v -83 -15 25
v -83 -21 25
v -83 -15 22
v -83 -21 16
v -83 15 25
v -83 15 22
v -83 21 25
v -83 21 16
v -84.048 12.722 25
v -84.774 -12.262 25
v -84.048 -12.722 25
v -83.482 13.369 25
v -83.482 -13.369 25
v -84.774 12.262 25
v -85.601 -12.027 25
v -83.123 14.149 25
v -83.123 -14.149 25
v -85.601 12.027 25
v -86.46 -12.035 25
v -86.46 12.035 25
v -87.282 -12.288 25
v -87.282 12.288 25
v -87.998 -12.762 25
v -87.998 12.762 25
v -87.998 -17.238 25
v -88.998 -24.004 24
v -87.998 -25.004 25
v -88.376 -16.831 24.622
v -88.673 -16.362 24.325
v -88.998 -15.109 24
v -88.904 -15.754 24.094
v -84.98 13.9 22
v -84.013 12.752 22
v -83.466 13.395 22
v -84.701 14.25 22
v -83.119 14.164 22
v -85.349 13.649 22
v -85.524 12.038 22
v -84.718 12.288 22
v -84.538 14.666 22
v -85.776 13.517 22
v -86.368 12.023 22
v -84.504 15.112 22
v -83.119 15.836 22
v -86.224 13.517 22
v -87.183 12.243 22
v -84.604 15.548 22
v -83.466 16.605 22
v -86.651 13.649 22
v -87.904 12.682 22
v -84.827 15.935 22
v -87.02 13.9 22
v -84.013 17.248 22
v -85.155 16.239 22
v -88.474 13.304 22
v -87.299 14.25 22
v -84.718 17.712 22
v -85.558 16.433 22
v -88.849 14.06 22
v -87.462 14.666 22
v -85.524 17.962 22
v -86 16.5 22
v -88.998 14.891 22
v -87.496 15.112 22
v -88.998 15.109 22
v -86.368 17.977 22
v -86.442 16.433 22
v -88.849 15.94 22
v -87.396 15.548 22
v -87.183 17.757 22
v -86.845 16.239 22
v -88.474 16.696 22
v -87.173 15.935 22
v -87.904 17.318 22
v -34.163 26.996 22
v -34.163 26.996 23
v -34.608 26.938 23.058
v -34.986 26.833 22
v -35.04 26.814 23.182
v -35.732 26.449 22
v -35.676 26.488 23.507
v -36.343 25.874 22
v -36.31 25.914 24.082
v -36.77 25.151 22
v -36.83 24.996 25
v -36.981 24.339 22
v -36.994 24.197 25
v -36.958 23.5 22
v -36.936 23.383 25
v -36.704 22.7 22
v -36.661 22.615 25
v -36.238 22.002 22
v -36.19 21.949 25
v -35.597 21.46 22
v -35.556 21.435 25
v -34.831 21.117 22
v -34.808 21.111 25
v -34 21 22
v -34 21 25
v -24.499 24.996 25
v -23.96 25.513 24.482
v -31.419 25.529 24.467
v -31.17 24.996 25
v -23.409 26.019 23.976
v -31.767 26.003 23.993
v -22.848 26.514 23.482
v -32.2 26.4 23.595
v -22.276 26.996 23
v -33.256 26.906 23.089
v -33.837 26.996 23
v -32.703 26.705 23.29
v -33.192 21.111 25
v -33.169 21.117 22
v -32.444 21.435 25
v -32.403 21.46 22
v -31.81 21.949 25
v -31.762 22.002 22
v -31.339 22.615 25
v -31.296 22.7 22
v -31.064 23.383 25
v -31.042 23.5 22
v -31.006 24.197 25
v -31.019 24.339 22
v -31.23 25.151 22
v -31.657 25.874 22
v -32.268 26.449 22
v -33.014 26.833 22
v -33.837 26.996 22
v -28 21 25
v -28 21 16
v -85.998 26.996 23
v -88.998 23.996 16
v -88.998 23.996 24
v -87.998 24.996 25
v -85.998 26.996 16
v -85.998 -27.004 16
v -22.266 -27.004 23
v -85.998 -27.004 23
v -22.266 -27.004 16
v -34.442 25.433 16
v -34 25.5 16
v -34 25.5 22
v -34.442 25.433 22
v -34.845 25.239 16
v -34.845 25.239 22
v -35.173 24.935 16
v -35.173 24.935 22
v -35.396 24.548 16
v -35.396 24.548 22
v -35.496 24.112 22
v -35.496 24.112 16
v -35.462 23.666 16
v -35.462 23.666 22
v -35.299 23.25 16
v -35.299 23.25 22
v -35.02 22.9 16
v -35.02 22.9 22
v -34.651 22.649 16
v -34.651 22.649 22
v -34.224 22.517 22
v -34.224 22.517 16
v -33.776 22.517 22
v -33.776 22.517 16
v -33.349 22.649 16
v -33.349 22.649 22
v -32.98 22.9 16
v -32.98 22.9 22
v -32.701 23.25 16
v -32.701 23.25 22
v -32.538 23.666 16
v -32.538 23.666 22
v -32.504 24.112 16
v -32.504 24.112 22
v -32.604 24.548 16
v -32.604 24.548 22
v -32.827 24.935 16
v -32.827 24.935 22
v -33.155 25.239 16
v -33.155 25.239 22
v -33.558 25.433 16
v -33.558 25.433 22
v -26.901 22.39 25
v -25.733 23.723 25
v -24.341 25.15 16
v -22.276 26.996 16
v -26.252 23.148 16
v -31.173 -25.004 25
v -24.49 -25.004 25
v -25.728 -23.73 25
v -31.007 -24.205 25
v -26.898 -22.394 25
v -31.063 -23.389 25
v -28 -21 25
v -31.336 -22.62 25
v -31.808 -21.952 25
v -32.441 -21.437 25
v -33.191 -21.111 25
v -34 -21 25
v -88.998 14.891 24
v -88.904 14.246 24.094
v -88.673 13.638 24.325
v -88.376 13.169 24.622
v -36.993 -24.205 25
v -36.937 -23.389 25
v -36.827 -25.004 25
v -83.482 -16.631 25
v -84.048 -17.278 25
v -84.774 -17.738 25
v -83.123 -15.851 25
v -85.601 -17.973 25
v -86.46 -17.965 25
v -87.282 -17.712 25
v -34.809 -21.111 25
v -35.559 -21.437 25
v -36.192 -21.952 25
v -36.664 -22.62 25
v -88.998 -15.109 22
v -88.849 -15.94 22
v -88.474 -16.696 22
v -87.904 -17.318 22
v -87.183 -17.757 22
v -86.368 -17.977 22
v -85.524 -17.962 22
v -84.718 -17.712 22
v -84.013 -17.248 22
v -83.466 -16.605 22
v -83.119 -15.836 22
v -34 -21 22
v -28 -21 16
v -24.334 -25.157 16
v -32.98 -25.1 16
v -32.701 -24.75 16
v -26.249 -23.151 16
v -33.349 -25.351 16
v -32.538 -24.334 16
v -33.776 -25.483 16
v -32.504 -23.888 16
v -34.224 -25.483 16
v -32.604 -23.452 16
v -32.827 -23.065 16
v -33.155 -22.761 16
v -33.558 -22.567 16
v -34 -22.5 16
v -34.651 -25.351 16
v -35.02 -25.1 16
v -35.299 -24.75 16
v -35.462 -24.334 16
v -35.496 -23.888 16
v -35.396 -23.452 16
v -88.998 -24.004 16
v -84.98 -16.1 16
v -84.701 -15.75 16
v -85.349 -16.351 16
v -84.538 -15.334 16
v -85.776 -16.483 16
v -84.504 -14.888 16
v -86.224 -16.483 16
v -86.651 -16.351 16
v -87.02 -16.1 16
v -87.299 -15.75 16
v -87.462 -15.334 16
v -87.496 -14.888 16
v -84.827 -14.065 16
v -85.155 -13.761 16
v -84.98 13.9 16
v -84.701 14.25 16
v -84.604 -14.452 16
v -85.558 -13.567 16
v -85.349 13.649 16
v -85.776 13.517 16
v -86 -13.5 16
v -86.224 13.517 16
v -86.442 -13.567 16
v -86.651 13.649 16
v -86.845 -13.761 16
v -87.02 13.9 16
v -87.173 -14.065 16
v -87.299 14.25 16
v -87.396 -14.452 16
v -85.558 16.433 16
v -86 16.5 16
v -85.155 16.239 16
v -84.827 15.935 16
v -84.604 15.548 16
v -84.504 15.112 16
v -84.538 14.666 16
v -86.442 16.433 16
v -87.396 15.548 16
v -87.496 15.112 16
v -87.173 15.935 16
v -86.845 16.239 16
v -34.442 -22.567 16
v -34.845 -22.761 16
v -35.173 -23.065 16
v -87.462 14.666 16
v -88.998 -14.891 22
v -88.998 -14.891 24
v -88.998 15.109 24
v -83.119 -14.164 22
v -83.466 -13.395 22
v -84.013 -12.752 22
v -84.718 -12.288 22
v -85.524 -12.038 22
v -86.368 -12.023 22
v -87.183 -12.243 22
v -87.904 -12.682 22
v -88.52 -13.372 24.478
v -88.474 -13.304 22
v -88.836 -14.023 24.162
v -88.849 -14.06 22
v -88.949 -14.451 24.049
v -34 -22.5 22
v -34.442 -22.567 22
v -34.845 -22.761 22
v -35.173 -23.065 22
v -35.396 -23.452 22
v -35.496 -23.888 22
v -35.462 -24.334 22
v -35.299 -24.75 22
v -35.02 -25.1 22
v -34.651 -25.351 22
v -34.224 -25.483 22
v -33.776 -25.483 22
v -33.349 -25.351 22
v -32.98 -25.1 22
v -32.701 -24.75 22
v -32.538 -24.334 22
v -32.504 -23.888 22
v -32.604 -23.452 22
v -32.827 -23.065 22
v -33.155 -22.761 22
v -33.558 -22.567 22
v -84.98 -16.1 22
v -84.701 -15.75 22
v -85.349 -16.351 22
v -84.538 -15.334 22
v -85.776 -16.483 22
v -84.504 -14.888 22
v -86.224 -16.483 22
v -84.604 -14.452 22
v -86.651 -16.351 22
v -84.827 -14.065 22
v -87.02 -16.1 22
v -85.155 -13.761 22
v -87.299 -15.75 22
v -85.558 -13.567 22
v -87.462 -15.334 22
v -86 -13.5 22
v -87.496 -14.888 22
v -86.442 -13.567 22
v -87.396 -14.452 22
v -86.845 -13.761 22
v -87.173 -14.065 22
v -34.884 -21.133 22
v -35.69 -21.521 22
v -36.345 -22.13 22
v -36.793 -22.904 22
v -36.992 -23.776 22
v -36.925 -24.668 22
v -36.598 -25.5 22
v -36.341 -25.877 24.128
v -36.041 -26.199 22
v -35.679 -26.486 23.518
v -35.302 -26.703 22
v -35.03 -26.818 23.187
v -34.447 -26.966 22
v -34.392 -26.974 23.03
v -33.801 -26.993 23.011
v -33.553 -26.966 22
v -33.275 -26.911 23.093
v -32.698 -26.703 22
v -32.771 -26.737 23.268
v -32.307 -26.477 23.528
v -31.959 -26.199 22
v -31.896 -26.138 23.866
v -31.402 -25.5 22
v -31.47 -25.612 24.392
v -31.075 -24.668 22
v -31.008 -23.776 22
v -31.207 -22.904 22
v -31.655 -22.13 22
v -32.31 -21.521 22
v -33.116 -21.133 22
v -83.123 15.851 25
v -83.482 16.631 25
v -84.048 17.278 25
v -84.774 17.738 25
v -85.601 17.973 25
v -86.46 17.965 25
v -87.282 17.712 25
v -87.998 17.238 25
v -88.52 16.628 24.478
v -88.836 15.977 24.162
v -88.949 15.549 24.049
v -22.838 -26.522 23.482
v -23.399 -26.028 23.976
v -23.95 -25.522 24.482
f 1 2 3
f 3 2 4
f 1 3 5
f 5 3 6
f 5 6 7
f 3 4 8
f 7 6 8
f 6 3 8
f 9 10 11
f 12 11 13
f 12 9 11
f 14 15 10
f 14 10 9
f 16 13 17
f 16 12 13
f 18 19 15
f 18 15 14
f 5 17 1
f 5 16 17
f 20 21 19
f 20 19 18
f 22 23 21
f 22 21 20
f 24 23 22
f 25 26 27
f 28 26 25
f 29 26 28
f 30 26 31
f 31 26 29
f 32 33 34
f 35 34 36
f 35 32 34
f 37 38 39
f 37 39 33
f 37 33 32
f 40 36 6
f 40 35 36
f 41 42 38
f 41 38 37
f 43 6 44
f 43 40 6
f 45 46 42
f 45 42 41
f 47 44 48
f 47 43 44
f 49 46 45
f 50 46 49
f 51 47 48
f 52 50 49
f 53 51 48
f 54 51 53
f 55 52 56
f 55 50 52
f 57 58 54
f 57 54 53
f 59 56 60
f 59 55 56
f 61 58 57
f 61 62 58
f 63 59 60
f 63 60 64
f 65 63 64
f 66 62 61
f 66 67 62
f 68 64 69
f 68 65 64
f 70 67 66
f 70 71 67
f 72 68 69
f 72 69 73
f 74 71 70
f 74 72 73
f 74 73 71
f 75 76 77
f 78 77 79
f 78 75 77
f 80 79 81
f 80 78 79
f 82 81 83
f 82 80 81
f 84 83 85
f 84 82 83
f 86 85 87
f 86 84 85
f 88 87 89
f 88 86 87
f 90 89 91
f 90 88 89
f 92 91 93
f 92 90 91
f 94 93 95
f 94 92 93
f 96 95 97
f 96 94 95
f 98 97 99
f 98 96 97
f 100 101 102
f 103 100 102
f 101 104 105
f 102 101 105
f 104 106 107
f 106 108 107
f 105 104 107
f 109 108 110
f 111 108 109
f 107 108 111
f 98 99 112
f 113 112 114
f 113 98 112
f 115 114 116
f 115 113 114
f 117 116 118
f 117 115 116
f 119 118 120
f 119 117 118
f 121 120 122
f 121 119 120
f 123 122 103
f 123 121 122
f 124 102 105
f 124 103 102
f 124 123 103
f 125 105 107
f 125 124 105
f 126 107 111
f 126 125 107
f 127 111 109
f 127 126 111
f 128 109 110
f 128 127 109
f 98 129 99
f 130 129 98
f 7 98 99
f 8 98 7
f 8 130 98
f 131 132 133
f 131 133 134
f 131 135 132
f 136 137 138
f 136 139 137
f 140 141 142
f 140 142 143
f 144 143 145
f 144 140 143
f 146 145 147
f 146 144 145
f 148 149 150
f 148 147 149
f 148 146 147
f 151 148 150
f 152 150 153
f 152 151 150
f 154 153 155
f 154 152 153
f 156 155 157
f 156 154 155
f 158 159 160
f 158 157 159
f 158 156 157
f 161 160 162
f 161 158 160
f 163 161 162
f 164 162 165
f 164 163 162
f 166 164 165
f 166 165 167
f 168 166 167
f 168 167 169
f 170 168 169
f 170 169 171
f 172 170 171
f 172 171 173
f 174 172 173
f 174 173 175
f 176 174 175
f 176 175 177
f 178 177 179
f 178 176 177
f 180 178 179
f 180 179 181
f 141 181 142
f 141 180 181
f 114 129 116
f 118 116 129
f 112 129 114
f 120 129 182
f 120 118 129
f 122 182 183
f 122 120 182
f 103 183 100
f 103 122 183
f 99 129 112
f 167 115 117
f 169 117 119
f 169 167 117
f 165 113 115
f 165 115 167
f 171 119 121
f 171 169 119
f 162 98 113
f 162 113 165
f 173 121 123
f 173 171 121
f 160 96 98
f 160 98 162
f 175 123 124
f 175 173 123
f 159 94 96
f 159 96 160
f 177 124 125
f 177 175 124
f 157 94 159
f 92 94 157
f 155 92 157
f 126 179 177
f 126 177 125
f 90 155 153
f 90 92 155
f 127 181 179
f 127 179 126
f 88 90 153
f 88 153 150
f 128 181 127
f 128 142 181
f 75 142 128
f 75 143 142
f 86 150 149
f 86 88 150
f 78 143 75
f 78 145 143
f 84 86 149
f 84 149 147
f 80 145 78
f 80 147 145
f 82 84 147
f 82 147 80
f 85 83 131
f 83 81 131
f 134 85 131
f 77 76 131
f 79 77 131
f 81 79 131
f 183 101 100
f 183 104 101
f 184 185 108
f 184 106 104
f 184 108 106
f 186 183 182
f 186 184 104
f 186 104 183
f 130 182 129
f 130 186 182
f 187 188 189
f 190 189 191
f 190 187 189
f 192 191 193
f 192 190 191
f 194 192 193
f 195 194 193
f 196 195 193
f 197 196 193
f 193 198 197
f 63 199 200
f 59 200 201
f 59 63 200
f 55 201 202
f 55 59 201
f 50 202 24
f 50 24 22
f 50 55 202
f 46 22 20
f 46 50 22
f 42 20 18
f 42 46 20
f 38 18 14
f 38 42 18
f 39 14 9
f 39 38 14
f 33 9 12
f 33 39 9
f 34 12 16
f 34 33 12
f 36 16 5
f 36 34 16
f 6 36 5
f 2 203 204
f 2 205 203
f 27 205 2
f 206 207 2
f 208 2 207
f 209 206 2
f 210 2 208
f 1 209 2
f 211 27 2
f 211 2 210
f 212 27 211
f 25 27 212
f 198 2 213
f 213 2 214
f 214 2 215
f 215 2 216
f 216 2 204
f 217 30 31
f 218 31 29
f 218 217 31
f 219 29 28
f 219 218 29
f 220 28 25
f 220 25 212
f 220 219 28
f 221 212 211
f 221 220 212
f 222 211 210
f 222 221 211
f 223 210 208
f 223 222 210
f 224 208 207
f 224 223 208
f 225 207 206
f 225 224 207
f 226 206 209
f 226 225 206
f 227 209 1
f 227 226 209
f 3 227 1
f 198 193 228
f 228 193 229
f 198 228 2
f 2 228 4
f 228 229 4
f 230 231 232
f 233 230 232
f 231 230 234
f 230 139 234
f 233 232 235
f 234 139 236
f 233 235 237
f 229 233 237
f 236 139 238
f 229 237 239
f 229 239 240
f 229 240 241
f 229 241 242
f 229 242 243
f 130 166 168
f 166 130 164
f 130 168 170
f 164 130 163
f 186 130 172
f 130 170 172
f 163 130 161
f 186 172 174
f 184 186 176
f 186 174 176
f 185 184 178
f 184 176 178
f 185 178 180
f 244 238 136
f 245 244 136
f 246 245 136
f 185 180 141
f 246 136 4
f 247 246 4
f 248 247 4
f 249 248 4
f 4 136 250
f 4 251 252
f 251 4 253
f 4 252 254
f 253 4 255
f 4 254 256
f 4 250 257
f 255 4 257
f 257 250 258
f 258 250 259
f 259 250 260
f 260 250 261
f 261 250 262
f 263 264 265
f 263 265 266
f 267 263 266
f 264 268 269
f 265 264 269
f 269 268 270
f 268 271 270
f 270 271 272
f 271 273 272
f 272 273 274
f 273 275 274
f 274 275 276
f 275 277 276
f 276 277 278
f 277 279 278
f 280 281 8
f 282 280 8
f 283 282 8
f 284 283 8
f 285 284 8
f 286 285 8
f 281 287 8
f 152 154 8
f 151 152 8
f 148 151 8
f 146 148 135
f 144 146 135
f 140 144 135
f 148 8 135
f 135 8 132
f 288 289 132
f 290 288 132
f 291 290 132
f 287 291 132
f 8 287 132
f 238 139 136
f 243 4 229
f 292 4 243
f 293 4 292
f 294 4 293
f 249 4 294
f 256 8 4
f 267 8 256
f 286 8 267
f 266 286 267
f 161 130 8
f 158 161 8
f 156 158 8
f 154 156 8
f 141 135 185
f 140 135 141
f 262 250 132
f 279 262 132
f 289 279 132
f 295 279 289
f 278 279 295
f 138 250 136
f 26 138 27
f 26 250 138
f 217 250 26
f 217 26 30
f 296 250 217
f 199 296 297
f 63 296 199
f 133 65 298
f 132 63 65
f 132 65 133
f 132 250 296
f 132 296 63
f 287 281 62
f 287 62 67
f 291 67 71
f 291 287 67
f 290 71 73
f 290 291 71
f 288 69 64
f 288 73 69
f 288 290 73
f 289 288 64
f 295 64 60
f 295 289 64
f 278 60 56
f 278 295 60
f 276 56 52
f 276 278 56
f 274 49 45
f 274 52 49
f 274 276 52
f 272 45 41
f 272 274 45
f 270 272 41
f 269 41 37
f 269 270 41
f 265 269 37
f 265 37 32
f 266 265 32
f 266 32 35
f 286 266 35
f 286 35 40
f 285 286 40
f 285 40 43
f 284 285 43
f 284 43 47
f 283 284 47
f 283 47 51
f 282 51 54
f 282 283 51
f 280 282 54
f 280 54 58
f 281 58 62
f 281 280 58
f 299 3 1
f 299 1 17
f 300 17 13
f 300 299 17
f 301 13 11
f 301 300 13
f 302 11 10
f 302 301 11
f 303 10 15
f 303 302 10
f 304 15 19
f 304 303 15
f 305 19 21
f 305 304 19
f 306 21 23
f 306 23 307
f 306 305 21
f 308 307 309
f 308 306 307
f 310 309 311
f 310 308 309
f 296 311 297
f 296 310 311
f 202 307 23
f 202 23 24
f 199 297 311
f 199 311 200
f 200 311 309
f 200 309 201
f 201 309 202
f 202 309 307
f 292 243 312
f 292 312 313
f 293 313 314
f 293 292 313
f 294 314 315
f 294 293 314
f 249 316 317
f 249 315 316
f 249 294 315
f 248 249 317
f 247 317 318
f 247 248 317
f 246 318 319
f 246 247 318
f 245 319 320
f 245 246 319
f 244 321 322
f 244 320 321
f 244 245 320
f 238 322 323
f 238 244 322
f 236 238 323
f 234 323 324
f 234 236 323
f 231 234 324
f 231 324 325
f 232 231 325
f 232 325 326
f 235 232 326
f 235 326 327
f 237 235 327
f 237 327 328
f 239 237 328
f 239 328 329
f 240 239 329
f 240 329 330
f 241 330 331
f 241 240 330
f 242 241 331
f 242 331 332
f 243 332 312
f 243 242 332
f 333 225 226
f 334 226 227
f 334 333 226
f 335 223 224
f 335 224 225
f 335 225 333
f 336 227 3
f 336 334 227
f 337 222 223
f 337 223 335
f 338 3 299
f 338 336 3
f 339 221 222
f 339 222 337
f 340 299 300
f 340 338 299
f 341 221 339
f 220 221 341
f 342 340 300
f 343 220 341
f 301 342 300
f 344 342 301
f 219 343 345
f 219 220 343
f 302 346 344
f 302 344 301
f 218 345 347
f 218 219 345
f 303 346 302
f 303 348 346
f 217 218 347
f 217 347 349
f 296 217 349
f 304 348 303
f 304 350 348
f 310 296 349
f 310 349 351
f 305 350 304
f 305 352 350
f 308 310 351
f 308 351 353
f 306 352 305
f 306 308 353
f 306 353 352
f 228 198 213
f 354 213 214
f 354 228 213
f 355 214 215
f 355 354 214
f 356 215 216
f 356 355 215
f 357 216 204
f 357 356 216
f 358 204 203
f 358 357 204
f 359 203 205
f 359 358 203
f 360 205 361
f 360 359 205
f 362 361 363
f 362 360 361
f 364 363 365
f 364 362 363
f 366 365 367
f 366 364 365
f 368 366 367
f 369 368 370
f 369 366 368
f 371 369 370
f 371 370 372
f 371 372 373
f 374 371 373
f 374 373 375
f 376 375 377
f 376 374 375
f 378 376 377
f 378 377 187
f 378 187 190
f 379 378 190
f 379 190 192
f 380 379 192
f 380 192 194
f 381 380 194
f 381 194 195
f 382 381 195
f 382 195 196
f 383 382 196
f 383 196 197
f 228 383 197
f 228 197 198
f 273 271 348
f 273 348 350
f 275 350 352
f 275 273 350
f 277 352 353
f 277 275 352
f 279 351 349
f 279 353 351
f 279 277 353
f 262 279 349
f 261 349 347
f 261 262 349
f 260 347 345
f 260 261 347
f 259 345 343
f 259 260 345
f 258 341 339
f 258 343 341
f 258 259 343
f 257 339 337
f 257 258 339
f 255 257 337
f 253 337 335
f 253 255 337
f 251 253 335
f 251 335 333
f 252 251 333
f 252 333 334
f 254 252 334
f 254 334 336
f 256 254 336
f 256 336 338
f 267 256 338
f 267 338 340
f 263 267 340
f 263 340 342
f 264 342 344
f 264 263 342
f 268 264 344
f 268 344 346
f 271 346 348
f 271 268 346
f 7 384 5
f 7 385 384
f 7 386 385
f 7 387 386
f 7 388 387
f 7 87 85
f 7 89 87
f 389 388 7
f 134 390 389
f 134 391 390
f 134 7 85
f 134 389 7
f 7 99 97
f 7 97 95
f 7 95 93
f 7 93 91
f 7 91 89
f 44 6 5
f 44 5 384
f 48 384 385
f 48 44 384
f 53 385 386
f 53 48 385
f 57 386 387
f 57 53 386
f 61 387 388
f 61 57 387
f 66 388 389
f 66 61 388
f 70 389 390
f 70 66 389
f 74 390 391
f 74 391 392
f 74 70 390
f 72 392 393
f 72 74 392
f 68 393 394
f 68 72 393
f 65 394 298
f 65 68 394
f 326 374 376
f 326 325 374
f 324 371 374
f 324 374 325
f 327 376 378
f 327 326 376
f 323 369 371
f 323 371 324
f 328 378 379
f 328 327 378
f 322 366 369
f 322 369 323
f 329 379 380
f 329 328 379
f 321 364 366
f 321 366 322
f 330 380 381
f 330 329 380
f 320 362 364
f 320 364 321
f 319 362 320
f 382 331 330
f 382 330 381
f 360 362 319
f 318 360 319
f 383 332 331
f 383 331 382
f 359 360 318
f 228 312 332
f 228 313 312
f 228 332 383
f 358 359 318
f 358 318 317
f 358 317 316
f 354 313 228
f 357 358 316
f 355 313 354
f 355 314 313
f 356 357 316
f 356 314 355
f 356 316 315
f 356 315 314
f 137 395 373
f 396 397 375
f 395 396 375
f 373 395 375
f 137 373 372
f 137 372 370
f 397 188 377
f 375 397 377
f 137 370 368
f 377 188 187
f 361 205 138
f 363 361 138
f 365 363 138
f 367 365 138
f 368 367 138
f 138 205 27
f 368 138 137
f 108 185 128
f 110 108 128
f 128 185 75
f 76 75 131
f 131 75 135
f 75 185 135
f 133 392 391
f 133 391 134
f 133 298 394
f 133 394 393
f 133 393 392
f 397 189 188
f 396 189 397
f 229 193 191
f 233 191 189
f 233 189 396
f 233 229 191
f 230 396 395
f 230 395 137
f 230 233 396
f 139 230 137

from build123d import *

# Parameters (mm, degrees)
CYLINDER1792_R         = 35
CYLINDER1792_DEPTH     = 32
CYLINDER1789_R         = 3
CYLINDER1789_DEPTH     = 3
CYLINDER1790_R         = 3
CYLINDER1790_DEPTH     = 3
CYLINDER1791_R         = 3
CYLINDER1791_DEPTH     = 3
CYLINDER1788_R         = 3
CYLINDER1788_DEPTH     = 3
CYLINDER1785_R         = 1.5
CYLINDER1785_DEPTH     = 60
CYLINDER1786_R         = 1.5
CYLINDER1786_DEPTH     = 60
CYLINDER1787_R         = 1.5
CYLINDER1787_DEPTH     = 60
CYLINDER1784_R         = 1.5
CYLINDER1784_DEPTH     = 60
BOX710_W               = 42
BOX710_H               = 64
BOX710_DEPTH           = 50
BOX709_W               = 54
BOX709_H               = 68
BOX709_DEPTH           = 9
CHAMFER059_SIZE        = 3
CHAMFER060_SIZE        = 2
CHAMFER061_SIZE        = 1
CUT521_PLACEMENT_ANGLE = 90
CUT525_PLACEMENT_ANGLE = 180


with BuildPart() as v_lec1792:
    # Cylinder1792 → Cylinder1792 (new body)
    with BuildSketch(Plane.XY.offset(-3)):
        Circle(CYLINDER1792_R)
    extrude(amount=CYLINDER1792_DEPTH)


with BuildPart() as v_lec1789:
    # Cylinder1789 → Cylinder1789 (new body)
    with BuildSketch(Plane(origin=(-24, 73, -80), x_dir=(1, 0, 0), z_dir=(0, 0, 1))):
        Circle(CYLINDER1789_R)
    extrude(amount=CYLINDER1789_DEPTH)


with BuildPart() as v_lec1790:
    # Cylinder1790 → Cylinder1790 (new body)
    with BuildSketch(Plane(origin=(-15, 125, -80), x_dir=(1, 0, 0), z_dir=(0, 0, 1))):
        Circle(CYLINDER1790_R)
    extrude(amount=CYLINDER1790_DEPTH)


with BuildPart() as v_lec1791:
    # Cylinder1791 → Cylinder1791 (new body)
    with BuildSketch(Plane(origin=(15, 125, -80), x_dir=(1, 0, 0), z_dir=(0, 0, 1))):
        Circle(CYLINDER1791_R)
    extrude(amount=CYLINDER1791_DEPTH)


with BuildPart() as compound888:
    # Cylinder1788 → Cylinder1788 (new body)
    with BuildSketch(Plane(origin=(24, 73, -80), x_dir=(1, 0, 0), z_dir=(0, 0, 1))):
        Circle(CYLINDER1788_R)
    extrude(amount=CYLINDER1788_DEPTH)

    # Compound888: union Válec1789, Válec1790, Válec1791
    add(v_lec1789.part)
    add(v_lec1790.part)
    add(v_lec1791.part)


with BuildPart() as compound888_1:
    # Compound888 placement: moved
    add(compound888.part.moved(Location((0, 0, 161))))


with BuildPart() as v_lec1785:
    # Cylinder1785 → Cylinder1785 (new body)
    with BuildSketch(Plane(origin=(-24, 73, -80), x_dir=(1, 0, 0), z_dir=(0, 0, 1))):
        Circle(CYLINDER1785_R)
    extrude(amount=CYLINDER1785_DEPTH)


with BuildPart() as v_lec1786:
    # Cylinder1786 → Cylinder1786 (new body)
    with BuildSketch(Plane(origin=(-15, 125, -80), x_dir=(1, 0, 0), z_dir=(0, 0, 1))):
        Circle(CYLINDER1786_R)
    extrude(amount=CYLINDER1786_DEPTH)


with BuildPart() as v_lec1787:
    # Cylinder1787 → Cylinder1787 (new body)
    with BuildSketch(Plane(origin=(15, 125, -80), x_dir=(1, 0, 0), z_dir=(0, 0, 1))):
        Circle(CYLINDER1787_R)
    extrude(amount=CYLINDER1787_DEPTH)


with BuildPart() as compound887:
    # Cylinder1784 → Cylinder1784 (new body)
    with BuildSketch(Plane(origin=(24, 73, -80), x_dir=(1, 0, 0), z_dir=(0, 0, 1))):
        Circle(CYLINDER1784_R)
    extrude(amount=CYLINDER1784_DEPTH)

    # Compound887: union Válec1785, Válec1786, Válec1787
    add(v_lec1785.part)
    add(v_lec1786.part)
    add(v_lec1787.part)


with BuildPart() as compound887_1:
    # Compound887 placement: moved
    add(compound887.part.moved(Location((0, 0, 120))))


with BuildPart() as krychle710:
    # Box710 → Box710 (new body)
    with BuildSketch(Plane(origin=(-21, 58, 38), x_dir=(1, 0, 0), z_dir=(0, 0, 1))):
        with Locations((21, 32)):
            Rectangle(BOX710_W, BOX710_H)
    extrude(amount=BOX710_DEPTH)


with BuildPart() as cut525:
    # Box709 → Box709 (new body)
    with BuildSketch(Plane(origin=(-27.004408, 59.99801, 75), x_dir=(1, 0, 0), z_dir=(0, 0, 1))):
        with Locations((27, 34)):
            Rectangle(BOX709_W, BOX709_H)
    extrude(amount=BOX709_DEPTH)

    # Cut519: cut Krychle710
    add(krychle710.part, mode=Mode.SUBTRACT)

    # Chamfer059
    chamfer059_edges = [cut525.edges().sort_by_distance(p)[0] for p in [
        (-27.004408, 127.99801, 79.5),
        (26.995592, 127.99801, 79.5),
    ]]
    chamfer(chamfer059_edges, length=CHAMFER059_SIZE)

    # Chamfer060
    chamfer060_edges = [cut525.edges().sort_by_distance(p)[0] for p in [
        (-27.004408, 92.49801, 84),
        (26.995592, 92.49801, 84),
    ]]
    chamfer(chamfer060_edges, length=CHAMFER060_SIZE)

    # Chamfer061
    chamfer061_edges = [cut525.edges().sort_by_distance(p)[0] for p in [
        (-0.004408, 127.99801, 84),
    ]]
    chamfer(chamfer061_edges, length=CHAMFER061_SIZE)

    # Cut520: cut Compound887
    add(compound887_1.part, mode=Mode.SUBTRACT)

    # Cut521: cut Compound888
    add(compound888_1.part, mode=Mode.SUBTRACT)


with BuildPart() as cut525_1:
    # Cut521 placement: moved
    add(cut525.part.moved(Location((-39, 0, -59))).rotate(Axis((-39, 0, -59), (0, 0, -1)), CUT521_PLACEMENT_ANGLE))

    # Cut525: cut Válec1792
    add(v_lec1792.part, mode=Mode.SUBTRACT)


with BuildPart() as cut525_2:
    # Cut525 placement: moved
    add(cut525_1.part.rotate(Axis((0, 0, 0), (0, 0, 1)), CUT525_PLACEMENT_ANGLE))


solid = cut525_2.part
